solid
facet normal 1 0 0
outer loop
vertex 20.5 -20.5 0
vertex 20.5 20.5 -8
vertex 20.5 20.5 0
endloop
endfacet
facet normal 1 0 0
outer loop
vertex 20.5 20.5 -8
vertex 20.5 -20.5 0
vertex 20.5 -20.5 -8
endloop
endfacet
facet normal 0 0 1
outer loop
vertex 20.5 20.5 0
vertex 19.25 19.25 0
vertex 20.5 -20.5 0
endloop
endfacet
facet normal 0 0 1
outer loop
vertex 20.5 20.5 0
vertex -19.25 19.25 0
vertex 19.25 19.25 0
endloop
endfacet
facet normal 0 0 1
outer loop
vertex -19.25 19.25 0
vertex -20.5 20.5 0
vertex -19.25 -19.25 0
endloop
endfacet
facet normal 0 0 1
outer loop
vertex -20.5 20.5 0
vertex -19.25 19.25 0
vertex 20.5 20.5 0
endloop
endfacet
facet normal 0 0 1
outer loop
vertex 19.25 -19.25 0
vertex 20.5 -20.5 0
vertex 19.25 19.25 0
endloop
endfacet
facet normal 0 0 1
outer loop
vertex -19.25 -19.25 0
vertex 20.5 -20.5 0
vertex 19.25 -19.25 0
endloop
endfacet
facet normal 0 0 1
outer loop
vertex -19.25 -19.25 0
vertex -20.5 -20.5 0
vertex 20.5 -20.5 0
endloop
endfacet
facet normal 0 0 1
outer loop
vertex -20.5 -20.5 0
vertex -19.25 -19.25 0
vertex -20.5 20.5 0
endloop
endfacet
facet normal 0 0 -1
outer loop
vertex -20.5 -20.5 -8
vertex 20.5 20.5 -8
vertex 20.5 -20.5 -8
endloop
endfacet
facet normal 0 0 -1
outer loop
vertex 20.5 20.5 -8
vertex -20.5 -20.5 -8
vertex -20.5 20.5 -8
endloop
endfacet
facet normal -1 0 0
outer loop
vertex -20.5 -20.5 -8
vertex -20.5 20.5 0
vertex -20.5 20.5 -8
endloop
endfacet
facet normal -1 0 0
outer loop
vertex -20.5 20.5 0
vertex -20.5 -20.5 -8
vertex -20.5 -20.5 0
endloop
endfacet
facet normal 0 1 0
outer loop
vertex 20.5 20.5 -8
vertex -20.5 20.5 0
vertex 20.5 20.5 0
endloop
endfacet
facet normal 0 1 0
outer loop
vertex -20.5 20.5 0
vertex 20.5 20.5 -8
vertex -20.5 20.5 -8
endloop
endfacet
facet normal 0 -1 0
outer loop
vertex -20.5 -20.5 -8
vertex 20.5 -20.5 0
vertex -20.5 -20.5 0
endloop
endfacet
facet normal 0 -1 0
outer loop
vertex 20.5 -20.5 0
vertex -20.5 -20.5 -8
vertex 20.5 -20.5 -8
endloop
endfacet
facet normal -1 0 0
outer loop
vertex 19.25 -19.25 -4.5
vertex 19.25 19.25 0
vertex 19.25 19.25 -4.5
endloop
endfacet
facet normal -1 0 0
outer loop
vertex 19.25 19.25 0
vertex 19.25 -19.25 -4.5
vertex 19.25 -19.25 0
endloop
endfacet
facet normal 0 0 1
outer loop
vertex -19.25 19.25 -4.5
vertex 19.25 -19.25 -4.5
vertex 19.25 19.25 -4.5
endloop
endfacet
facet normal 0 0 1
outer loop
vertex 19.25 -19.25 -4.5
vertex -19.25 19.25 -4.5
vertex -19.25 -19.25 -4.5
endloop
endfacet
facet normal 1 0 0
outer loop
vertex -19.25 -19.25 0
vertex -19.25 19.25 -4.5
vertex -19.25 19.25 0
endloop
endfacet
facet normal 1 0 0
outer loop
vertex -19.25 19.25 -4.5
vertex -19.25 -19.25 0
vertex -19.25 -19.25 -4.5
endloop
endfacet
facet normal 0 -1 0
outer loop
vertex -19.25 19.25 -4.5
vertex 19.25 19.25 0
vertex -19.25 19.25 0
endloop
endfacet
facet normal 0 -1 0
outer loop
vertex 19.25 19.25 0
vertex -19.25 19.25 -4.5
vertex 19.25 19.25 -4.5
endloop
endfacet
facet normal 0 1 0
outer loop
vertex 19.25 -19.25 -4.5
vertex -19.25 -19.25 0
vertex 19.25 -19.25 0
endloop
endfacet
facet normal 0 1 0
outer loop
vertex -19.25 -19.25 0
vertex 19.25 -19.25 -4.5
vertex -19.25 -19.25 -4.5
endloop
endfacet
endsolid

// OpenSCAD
difference() {
	translate([0,0,-4]) cube([41,41,8], center=true);
	translate([0,0,-2]) cube([38.5,38.5,5], center=true);
}
